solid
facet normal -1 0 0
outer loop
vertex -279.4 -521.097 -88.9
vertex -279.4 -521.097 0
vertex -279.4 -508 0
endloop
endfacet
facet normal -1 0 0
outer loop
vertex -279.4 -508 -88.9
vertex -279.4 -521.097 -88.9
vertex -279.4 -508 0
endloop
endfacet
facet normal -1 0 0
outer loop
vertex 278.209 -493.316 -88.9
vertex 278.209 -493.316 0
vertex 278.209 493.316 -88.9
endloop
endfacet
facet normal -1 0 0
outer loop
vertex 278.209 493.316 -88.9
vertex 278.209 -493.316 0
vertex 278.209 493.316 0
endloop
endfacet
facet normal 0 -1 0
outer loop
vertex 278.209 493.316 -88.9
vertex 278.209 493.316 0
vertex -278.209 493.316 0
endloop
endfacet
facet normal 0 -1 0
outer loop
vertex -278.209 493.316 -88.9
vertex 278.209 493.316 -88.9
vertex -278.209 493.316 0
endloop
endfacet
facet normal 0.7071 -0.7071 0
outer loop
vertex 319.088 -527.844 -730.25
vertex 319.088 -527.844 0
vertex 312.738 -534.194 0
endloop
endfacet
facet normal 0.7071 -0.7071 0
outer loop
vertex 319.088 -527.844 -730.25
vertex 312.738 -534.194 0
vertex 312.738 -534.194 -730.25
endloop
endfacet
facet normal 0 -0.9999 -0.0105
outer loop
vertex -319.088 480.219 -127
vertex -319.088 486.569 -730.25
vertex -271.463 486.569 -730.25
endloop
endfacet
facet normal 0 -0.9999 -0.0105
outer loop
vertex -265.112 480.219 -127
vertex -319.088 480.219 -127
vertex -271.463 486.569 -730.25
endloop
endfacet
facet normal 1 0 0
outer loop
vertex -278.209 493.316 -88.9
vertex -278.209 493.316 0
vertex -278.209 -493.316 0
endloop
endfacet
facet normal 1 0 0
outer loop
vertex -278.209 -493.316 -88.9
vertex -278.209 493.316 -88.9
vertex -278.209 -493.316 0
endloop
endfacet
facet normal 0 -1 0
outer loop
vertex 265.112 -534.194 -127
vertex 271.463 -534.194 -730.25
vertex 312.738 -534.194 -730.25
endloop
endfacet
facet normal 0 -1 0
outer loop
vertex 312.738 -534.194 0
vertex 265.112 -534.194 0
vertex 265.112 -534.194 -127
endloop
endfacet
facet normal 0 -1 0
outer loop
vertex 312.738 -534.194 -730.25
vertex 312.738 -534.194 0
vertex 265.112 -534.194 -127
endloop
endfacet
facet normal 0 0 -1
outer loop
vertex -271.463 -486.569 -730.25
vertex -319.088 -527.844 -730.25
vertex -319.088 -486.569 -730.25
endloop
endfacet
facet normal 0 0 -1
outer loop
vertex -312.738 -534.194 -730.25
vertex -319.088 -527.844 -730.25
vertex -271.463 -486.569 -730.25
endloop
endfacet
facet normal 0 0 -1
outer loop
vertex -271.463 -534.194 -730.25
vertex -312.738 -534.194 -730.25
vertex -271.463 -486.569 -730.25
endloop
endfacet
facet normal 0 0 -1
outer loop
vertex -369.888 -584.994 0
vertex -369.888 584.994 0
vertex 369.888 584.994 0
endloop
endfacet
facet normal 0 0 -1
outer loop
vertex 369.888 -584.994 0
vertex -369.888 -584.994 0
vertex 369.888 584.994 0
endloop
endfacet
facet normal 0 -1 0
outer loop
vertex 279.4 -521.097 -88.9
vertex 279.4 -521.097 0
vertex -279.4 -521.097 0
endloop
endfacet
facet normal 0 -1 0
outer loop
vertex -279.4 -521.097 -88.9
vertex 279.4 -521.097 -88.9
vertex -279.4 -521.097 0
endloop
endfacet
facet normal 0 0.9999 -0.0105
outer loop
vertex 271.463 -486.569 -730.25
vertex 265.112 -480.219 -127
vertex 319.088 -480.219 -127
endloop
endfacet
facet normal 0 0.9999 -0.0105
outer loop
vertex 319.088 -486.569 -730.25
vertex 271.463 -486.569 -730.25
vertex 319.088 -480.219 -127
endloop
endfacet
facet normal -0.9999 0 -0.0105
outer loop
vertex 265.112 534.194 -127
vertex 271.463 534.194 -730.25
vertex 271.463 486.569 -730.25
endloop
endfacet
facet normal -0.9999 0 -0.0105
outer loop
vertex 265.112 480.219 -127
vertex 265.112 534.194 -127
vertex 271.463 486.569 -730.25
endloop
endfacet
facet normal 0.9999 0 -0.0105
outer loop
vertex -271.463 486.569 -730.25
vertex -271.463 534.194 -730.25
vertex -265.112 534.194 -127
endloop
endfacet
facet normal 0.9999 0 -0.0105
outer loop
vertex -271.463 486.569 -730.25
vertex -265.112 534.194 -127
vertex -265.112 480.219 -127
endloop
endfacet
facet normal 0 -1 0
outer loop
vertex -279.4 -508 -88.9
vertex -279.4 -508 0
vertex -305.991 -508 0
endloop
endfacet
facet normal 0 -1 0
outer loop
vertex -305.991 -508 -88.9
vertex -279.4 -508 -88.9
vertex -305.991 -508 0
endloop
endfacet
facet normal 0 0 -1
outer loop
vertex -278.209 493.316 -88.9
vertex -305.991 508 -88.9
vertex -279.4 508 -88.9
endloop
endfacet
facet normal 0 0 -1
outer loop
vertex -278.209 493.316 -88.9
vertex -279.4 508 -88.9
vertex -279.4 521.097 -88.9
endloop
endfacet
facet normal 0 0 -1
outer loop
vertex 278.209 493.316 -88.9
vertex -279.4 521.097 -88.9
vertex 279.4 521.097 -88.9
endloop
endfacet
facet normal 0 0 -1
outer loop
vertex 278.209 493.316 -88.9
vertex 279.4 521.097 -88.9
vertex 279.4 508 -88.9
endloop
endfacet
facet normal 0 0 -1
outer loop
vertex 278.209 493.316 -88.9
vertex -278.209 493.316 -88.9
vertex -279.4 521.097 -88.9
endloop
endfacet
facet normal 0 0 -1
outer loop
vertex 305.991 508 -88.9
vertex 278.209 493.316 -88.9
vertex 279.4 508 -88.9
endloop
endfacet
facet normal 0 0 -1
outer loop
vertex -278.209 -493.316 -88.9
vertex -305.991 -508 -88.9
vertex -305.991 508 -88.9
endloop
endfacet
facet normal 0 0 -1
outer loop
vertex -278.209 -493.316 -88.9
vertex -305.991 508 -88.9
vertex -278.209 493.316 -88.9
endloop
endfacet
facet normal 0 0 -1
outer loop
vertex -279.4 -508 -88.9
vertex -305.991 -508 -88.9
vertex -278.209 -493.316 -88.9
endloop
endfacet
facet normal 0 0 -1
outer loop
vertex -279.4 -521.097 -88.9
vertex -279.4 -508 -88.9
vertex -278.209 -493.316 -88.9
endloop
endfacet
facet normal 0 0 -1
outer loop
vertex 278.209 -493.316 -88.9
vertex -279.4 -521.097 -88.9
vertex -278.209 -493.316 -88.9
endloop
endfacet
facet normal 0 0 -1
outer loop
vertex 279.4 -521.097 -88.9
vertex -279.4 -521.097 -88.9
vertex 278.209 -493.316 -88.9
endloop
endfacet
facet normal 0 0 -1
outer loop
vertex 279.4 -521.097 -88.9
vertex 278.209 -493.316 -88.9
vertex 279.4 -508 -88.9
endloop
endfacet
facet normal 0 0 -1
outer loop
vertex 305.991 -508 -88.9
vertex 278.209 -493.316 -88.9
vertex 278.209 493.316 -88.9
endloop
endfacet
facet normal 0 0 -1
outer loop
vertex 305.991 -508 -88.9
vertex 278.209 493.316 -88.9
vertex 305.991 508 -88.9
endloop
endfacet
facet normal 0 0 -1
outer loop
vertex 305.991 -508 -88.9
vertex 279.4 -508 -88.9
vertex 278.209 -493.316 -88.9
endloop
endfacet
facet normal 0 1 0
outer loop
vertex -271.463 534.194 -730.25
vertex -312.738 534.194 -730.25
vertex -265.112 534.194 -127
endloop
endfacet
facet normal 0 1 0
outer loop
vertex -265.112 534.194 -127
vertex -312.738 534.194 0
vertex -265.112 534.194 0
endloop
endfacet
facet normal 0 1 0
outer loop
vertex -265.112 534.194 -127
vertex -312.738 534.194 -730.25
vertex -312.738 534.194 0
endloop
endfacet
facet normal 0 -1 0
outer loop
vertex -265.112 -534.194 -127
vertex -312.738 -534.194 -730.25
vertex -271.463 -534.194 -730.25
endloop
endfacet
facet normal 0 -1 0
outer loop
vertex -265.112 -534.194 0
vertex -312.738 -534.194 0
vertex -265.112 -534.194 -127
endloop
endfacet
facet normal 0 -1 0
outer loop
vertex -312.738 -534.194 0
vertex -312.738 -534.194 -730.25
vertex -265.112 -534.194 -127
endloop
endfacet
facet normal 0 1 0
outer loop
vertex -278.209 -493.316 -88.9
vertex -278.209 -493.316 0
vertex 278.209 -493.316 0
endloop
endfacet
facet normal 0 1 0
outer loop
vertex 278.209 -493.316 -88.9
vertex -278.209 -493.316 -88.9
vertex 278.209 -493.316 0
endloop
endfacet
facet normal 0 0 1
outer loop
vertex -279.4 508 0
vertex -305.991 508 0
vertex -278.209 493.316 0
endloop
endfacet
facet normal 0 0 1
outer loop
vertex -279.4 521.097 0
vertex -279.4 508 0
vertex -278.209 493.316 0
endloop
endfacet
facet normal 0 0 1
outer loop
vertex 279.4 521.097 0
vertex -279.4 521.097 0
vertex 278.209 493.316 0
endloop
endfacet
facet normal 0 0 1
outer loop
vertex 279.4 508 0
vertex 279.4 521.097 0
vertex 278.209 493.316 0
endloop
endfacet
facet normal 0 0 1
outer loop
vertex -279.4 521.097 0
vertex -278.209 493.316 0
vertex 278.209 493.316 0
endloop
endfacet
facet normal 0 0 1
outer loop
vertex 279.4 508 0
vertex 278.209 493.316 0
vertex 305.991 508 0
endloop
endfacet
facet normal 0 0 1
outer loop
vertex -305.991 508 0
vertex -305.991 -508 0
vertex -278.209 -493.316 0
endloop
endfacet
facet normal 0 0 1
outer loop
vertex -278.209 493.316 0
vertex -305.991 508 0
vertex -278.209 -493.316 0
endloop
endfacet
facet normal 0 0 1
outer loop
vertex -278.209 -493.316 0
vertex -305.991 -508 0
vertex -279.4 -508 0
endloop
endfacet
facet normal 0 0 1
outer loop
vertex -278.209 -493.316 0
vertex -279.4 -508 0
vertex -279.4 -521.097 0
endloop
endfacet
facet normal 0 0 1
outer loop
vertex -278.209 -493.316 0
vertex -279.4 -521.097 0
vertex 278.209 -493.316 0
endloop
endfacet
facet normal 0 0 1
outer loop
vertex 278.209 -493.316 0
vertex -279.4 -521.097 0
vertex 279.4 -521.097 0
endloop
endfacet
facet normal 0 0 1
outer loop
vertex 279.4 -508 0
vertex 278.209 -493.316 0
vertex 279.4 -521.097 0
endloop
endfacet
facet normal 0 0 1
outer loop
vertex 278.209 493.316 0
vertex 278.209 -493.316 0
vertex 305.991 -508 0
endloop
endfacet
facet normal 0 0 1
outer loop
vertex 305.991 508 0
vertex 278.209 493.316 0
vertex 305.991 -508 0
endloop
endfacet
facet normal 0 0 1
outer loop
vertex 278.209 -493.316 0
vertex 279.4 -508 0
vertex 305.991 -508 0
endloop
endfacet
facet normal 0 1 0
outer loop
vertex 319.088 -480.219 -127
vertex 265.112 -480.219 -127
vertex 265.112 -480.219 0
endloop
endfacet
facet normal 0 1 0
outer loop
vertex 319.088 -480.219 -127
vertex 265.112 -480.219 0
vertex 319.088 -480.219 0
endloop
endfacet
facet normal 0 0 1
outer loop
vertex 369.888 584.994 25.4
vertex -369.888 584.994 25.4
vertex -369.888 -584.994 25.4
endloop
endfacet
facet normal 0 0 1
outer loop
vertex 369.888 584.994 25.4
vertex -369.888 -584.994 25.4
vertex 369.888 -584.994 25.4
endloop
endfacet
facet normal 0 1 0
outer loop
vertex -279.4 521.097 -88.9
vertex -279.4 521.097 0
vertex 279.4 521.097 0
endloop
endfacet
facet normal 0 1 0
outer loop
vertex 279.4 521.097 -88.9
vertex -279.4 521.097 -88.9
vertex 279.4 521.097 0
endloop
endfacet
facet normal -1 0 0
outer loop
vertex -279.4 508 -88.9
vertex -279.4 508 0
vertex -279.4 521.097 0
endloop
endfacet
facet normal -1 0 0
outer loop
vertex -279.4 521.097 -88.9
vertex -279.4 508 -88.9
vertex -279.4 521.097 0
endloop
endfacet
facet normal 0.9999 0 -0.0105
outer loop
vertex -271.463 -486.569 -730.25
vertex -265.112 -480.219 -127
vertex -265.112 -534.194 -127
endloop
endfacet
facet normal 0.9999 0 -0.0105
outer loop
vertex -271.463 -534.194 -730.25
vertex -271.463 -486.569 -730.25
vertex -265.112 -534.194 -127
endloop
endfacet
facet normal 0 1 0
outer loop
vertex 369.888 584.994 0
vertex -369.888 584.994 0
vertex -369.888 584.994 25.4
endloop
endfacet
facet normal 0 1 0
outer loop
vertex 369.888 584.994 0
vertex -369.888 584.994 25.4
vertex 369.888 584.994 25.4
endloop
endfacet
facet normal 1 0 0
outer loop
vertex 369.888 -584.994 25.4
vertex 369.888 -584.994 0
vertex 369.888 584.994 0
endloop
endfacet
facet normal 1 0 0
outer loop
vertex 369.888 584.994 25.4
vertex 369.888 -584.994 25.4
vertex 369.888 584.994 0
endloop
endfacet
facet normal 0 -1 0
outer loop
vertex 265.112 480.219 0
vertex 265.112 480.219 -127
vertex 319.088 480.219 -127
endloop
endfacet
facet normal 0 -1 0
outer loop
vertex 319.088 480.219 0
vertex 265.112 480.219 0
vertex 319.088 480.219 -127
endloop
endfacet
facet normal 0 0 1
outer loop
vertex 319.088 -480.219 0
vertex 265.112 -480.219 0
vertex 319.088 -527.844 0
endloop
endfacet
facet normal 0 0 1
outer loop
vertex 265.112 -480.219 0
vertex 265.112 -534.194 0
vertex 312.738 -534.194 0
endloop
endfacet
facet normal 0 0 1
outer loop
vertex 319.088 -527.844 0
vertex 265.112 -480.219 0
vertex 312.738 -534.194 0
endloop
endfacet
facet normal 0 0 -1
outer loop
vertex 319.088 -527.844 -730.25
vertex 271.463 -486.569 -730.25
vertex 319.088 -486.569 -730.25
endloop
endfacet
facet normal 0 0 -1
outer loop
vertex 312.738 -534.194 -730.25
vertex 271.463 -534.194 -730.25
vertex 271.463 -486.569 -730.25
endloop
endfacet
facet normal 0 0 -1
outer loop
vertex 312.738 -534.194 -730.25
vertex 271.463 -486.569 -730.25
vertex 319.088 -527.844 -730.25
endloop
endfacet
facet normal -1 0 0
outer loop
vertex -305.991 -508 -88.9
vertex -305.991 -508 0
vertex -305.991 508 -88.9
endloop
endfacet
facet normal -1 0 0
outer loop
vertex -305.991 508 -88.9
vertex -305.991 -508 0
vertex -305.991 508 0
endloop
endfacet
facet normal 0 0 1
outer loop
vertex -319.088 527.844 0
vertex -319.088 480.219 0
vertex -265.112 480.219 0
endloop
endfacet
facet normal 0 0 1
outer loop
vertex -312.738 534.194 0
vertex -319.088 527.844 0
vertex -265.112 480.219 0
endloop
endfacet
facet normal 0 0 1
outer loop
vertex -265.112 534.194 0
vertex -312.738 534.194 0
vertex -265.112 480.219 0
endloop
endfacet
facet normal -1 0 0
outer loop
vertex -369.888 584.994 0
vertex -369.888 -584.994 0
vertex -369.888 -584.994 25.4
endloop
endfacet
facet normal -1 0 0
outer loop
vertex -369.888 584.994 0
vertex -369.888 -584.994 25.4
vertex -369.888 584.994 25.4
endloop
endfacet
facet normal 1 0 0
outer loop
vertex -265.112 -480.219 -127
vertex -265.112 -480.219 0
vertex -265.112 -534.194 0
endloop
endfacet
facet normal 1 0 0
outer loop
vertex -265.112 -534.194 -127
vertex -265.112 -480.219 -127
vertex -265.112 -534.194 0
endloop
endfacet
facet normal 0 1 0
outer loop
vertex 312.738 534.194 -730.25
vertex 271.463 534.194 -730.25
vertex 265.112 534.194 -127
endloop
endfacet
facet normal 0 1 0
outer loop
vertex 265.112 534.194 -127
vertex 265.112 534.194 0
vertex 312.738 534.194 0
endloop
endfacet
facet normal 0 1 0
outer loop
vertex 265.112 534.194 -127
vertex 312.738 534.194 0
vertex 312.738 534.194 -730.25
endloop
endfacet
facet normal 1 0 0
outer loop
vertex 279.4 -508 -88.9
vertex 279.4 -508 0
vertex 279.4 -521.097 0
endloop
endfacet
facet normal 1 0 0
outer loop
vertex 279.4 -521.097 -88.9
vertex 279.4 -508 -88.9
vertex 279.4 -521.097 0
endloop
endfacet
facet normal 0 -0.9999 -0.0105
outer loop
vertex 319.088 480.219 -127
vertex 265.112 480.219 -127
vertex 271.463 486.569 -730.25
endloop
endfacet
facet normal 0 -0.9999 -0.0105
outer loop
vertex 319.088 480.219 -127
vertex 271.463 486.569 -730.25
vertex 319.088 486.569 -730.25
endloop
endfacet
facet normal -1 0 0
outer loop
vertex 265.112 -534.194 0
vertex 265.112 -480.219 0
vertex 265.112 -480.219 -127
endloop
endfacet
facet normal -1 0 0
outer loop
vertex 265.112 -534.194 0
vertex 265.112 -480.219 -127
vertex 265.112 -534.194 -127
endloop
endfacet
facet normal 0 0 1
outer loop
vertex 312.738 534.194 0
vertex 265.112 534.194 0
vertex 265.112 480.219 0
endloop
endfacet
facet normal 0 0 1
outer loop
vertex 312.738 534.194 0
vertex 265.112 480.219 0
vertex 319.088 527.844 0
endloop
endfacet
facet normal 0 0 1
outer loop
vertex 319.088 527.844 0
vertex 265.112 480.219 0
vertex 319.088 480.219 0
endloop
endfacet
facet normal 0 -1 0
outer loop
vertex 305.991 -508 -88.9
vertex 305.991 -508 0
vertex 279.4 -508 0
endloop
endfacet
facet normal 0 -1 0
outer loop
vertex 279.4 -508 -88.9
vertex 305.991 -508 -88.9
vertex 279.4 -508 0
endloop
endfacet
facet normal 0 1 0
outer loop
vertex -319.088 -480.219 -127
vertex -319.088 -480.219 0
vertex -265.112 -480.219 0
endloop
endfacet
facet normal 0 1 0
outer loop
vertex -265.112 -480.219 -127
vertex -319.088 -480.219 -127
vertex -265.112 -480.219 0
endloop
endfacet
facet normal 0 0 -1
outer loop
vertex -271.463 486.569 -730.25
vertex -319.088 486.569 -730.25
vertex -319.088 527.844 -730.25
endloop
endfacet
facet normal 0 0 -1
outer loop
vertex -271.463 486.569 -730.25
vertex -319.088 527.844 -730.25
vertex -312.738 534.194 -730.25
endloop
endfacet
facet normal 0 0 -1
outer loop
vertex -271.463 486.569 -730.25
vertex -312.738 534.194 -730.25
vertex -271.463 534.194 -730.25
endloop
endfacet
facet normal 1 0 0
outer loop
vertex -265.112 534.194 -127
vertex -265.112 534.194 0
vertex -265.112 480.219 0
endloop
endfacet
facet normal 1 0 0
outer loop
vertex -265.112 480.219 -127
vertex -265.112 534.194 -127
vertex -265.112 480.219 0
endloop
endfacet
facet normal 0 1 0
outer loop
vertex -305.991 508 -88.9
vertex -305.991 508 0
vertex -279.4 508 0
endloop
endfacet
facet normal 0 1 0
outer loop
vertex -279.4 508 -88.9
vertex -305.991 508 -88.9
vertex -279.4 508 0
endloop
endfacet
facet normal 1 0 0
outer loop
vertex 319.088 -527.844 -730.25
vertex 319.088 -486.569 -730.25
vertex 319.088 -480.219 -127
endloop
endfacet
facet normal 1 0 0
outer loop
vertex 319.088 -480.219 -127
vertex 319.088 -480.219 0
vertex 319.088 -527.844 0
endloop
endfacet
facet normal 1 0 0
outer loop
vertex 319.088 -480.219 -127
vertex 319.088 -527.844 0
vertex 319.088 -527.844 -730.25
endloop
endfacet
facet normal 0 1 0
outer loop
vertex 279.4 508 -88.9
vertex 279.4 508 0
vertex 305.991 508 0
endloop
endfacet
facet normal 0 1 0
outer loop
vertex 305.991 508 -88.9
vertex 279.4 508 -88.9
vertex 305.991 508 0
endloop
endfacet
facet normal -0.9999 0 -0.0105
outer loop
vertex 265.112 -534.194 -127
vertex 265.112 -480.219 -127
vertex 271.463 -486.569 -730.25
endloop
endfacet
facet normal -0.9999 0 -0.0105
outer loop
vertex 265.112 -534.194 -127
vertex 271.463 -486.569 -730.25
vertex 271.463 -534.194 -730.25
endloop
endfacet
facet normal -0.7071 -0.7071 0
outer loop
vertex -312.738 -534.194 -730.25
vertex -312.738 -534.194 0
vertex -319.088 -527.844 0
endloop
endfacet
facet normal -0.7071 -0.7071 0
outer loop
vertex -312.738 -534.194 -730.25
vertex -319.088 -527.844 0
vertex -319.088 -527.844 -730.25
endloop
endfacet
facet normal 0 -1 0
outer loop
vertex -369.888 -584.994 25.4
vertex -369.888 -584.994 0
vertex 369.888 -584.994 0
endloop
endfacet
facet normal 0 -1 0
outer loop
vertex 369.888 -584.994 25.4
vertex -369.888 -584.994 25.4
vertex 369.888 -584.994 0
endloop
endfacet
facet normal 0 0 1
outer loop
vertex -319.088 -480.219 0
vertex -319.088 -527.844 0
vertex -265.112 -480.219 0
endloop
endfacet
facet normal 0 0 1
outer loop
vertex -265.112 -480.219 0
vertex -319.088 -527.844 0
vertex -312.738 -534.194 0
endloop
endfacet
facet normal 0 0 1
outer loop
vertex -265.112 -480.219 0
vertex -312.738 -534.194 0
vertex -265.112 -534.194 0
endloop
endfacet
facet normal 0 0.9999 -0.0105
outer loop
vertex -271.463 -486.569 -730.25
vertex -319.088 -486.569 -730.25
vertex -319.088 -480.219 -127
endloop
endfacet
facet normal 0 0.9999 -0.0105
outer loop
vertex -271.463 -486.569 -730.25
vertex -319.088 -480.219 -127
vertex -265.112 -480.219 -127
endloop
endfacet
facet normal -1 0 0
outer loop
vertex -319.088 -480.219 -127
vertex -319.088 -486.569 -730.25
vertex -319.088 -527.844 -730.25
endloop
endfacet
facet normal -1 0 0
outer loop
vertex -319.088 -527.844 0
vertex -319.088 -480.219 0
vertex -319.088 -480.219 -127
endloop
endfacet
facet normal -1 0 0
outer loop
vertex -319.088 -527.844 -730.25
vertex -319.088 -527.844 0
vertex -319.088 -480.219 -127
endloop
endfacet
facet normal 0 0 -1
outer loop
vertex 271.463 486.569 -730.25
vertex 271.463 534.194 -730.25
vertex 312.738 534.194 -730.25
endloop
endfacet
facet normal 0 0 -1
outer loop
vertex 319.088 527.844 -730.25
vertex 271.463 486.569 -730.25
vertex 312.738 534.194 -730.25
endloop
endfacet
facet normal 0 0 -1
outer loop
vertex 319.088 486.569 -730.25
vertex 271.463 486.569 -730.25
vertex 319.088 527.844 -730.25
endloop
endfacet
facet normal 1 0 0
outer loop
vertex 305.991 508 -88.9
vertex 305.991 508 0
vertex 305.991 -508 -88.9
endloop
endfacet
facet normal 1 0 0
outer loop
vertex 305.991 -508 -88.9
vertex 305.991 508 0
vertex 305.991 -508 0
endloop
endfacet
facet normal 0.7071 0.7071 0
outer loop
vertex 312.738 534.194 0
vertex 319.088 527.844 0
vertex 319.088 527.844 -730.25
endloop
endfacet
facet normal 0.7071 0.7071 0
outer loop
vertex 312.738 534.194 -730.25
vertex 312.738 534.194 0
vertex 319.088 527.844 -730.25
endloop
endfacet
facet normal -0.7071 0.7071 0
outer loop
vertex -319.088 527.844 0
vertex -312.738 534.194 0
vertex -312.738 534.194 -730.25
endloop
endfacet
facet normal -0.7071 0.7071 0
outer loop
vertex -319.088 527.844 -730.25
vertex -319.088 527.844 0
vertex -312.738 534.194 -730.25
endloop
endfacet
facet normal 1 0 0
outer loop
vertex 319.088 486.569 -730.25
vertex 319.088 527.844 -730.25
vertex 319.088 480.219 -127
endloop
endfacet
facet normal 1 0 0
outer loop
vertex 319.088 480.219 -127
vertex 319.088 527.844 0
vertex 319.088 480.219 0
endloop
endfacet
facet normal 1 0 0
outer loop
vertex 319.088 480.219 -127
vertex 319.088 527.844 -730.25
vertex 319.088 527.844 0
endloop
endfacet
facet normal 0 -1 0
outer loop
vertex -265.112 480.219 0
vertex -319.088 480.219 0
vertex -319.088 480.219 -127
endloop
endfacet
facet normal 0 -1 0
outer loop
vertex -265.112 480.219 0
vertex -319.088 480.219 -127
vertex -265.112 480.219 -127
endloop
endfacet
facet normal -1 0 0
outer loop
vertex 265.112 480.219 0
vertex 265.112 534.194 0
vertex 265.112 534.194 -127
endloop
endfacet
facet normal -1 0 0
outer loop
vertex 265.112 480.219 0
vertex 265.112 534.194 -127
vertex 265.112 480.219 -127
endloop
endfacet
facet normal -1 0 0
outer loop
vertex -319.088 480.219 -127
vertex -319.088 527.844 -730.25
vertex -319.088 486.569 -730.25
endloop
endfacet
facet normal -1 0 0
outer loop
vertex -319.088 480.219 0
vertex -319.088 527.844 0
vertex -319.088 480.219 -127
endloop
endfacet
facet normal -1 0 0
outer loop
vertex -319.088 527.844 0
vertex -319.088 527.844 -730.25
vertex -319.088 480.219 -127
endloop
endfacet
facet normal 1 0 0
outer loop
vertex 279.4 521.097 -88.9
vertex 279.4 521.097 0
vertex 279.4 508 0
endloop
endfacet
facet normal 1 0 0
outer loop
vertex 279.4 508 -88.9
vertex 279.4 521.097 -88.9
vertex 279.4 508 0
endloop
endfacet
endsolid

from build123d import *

# Parameters (mm, degrees)
F0_W     = 739.775
F0_H     = 1169.9875
F1_DEPTH = 25.4
F2_W     = 53.975
F2_H     = 53.975
F3_DEPTH = 730.25
F4_W     = 1.190625
F4_H     = 14.684375
F5_DEPTH = 88.9
F6_SIZE2 = 603.25
F6_SIZE  = 6.35
F7_SIZE2 = 603.25
F7_SIZE  = 6.35
F8_SIZE2 = 603.25
F8_SIZE  = 6.35
F9_SIZE2 = 603.25
F9_SIZE  = 6.35
F10_SIZE = 6.35
F11_SIZE = 6.35
F12_SIZE = 6.35
F13_SIZE = 6.35


with BuildPart() as f1:
    # F0 (on Top) → F1 (new body)
    with BuildSketch(Plane.XY):
        Rectangle(F0_W, F0_H)
    extrude(amount=F1_DEPTH)


with BuildPart() as f3:
    # F2 (on face) → F3 (new body)
    with BuildSketch(Plane(origin=(0, 0, 0), x_dir=(1, 0, 0), z_dir=(0, 0, -1))):
        with Locations((-292.1, -507.20625)):
            Rectangle(F2_W, F2_H)
    extrude(amount=F3_DEPTH)

    # F6
    f6_edges = [f3.edges().sort_by_distance(p)[0] for p in [
        (-265.1125, 507.20625, -730.25),
        (-292.1, 480.21875, -730.25),
    ]]
    f6_side = f3.faces().sort_by_distance((-292.1, 507.20625, -730.25))[0]
    chamfer(f6_edges, length=F6_SIZE, length2=F6_SIZE2, reference=f6_side)

    # F12
    f12_edges = [f3.edges().sort_by_distance(p)[0] for p in [
        (-319.0875, 534.19375, -365.125),
    ]]
    chamfer(f12_edges, length=F12_SIZE)


with BuildPart() as f3b:
    # F2 (on face) → F3, piece 2 (new body)
    with BuildSketch(Plane(origin=(0, 0, 0), x_dir=(1, 0, 0), z_dir=(0, 0, -1))):
        with Locations((292.1, -507.20625)):
            Rectangle(F2_W, F2_H)
    extrude(amount=F3_DEPTH)

    # F7
    f7_edges = [f3b.edges().sort_by_distance(p)[0] for p in [
        (265.1125, 507.20625, -730.25),
        (292.1, 480.21875, -730.25),
    ]]
    f7_side = f3b.faces().sort_by_distance((292.1, 507.20625, -730.25))[0]
    chamfer(f7_edges, length=F7_SIZE, length2=F7_SIZE2, reference=f7_side)

    # F13
    f13_edges = [f3b.edges().sort_by_distance(p)[0] for p in [
        (319.0875, 534.19375, -365.125),
    ]]
    chamfer(f13_edges, length=F13_SIZE)


with BuildPart() as f3c:
    # F2 (on face) → F3, piece 3 (new body)
    with BuildSketch(Plane(origin=(0, 0, 0), x_dir=(1, 0, 0), z_dir=(0, 0, -1))):
        with Locations((-292.1, 507.20625)):
            Rectangle(F2_W, F2_H)
    extrude(amount=F3_DEPTH)

    # F9
    f9_edges = [f3c.edges().sort_by_distance(p)[0] for p in [
        (-265.1125, -507.20625, -730.25),
        (-292.1, -480.21875, -730.25),
    ]]
    f9_side = f3c.faces().sort_by_distance((-292.1, -507.20625, -730.25))[0]
    chamfer(f9_edges, length=F9_SIZE, length2=F9_SIZE2, reference=f9_side)

    # F10
    f10_edges = [f3c.edges().sort_by_distance(p)[0] for p in [
        (-319.0875, -534.19375, -365.125),
    ]]
    chamfer(f10_edges, length=F10_SIZE)


with BuildPart() as f3d:
    # F2 (on face) → F3, piece 4 (new body)
    with BuildSketch(Plane(origin=(0, 0, 0), x_dir=(1, 0, 0), z_dir=(0, 0, -1))):
        with Locations((292.1, 507.20625)):
            Rectangle(F2_W, F2_H)
    extrude(amount=F3_DEPTH)

    # F8
    f8_edges = [f3d.edges().sort_by_distance(p)[0] for p in [
        (292.1, -480.21875, -730.25),
        (265.1125, -507.20625, -730.25),
    ]]
    f8_side = f3d.faces().sort_by_distance((292.1, -507.20625, -730.25))[0]
    chamfer(f8_edges, length=F8_SIZE, length2=F8_SIZE2, reference=f8_side)

    # F11
    f11_edges = [f3d.edges().sort_by_distance(p)[0] for p in [
        (319.0875, -534.19375, -365.125),
    ]]
    chamfer(f11_edges, length=F11_SIZE)


with BuildPart() as f5:
    # F4 (on face) → F5 (new body)
    with BuildSketch(Plane(origin=(0, 0, 0), x_dir=(1, 0, 0), z_dir=(0, 0, -1))):
        Polygon((-279.4, -508), (-279.4, -493.315625), (-278.209375, -493.315625), (-278.209375, 493.315625), (-279.4, 493.315625), (-279.4, 508), (-305.990625, 508), (-305.990625, -508), align=None)
        with Locations((-278.8046875, -500.6578125)):
            Rectangle(F4_W, F4_H)
        Polygon((278.209375, -493.315625), (-278.209375, -493.315625), (-278.209375, -508), (-279.4, -508), (-279.4, -521.096875), (279.4, -521.096875), (279.4, -508), (278.209375, -508), align=None)
        Polygon((278.209375, 493.315625), (278.209375, -493.315625), (279.4, -493.315625), (279.4, -508), (305.990625, -508), (305.990625, 508), (279.4, 508), (279.4, 493.315625), align=None)
        with Locations((278.8046875, -500.6578125)):
            Rectangle(F4_W, F4_H)
        with Locations((-278.8046875, 500.6578125)):
            Rectangle(F4_W, F4_H)
        Polygon((-278.209375, 508), (-278.209375, 493.315625), (278.209375, 493.315625), (278.209375, 508), (279.4, 508), (279.4, 521.096875), (-279.4, 521.096875), (-279.4, 508), align=None)
        with Locations((278.8046875, 500.6578125)):
            Rectangle(F4_W, F4_H)
    extrude(amount=F5_DEPTH)


solid = Compound([f1.part, f3.part, f3b.part, f3c.part, f3d.part, f5.part])
